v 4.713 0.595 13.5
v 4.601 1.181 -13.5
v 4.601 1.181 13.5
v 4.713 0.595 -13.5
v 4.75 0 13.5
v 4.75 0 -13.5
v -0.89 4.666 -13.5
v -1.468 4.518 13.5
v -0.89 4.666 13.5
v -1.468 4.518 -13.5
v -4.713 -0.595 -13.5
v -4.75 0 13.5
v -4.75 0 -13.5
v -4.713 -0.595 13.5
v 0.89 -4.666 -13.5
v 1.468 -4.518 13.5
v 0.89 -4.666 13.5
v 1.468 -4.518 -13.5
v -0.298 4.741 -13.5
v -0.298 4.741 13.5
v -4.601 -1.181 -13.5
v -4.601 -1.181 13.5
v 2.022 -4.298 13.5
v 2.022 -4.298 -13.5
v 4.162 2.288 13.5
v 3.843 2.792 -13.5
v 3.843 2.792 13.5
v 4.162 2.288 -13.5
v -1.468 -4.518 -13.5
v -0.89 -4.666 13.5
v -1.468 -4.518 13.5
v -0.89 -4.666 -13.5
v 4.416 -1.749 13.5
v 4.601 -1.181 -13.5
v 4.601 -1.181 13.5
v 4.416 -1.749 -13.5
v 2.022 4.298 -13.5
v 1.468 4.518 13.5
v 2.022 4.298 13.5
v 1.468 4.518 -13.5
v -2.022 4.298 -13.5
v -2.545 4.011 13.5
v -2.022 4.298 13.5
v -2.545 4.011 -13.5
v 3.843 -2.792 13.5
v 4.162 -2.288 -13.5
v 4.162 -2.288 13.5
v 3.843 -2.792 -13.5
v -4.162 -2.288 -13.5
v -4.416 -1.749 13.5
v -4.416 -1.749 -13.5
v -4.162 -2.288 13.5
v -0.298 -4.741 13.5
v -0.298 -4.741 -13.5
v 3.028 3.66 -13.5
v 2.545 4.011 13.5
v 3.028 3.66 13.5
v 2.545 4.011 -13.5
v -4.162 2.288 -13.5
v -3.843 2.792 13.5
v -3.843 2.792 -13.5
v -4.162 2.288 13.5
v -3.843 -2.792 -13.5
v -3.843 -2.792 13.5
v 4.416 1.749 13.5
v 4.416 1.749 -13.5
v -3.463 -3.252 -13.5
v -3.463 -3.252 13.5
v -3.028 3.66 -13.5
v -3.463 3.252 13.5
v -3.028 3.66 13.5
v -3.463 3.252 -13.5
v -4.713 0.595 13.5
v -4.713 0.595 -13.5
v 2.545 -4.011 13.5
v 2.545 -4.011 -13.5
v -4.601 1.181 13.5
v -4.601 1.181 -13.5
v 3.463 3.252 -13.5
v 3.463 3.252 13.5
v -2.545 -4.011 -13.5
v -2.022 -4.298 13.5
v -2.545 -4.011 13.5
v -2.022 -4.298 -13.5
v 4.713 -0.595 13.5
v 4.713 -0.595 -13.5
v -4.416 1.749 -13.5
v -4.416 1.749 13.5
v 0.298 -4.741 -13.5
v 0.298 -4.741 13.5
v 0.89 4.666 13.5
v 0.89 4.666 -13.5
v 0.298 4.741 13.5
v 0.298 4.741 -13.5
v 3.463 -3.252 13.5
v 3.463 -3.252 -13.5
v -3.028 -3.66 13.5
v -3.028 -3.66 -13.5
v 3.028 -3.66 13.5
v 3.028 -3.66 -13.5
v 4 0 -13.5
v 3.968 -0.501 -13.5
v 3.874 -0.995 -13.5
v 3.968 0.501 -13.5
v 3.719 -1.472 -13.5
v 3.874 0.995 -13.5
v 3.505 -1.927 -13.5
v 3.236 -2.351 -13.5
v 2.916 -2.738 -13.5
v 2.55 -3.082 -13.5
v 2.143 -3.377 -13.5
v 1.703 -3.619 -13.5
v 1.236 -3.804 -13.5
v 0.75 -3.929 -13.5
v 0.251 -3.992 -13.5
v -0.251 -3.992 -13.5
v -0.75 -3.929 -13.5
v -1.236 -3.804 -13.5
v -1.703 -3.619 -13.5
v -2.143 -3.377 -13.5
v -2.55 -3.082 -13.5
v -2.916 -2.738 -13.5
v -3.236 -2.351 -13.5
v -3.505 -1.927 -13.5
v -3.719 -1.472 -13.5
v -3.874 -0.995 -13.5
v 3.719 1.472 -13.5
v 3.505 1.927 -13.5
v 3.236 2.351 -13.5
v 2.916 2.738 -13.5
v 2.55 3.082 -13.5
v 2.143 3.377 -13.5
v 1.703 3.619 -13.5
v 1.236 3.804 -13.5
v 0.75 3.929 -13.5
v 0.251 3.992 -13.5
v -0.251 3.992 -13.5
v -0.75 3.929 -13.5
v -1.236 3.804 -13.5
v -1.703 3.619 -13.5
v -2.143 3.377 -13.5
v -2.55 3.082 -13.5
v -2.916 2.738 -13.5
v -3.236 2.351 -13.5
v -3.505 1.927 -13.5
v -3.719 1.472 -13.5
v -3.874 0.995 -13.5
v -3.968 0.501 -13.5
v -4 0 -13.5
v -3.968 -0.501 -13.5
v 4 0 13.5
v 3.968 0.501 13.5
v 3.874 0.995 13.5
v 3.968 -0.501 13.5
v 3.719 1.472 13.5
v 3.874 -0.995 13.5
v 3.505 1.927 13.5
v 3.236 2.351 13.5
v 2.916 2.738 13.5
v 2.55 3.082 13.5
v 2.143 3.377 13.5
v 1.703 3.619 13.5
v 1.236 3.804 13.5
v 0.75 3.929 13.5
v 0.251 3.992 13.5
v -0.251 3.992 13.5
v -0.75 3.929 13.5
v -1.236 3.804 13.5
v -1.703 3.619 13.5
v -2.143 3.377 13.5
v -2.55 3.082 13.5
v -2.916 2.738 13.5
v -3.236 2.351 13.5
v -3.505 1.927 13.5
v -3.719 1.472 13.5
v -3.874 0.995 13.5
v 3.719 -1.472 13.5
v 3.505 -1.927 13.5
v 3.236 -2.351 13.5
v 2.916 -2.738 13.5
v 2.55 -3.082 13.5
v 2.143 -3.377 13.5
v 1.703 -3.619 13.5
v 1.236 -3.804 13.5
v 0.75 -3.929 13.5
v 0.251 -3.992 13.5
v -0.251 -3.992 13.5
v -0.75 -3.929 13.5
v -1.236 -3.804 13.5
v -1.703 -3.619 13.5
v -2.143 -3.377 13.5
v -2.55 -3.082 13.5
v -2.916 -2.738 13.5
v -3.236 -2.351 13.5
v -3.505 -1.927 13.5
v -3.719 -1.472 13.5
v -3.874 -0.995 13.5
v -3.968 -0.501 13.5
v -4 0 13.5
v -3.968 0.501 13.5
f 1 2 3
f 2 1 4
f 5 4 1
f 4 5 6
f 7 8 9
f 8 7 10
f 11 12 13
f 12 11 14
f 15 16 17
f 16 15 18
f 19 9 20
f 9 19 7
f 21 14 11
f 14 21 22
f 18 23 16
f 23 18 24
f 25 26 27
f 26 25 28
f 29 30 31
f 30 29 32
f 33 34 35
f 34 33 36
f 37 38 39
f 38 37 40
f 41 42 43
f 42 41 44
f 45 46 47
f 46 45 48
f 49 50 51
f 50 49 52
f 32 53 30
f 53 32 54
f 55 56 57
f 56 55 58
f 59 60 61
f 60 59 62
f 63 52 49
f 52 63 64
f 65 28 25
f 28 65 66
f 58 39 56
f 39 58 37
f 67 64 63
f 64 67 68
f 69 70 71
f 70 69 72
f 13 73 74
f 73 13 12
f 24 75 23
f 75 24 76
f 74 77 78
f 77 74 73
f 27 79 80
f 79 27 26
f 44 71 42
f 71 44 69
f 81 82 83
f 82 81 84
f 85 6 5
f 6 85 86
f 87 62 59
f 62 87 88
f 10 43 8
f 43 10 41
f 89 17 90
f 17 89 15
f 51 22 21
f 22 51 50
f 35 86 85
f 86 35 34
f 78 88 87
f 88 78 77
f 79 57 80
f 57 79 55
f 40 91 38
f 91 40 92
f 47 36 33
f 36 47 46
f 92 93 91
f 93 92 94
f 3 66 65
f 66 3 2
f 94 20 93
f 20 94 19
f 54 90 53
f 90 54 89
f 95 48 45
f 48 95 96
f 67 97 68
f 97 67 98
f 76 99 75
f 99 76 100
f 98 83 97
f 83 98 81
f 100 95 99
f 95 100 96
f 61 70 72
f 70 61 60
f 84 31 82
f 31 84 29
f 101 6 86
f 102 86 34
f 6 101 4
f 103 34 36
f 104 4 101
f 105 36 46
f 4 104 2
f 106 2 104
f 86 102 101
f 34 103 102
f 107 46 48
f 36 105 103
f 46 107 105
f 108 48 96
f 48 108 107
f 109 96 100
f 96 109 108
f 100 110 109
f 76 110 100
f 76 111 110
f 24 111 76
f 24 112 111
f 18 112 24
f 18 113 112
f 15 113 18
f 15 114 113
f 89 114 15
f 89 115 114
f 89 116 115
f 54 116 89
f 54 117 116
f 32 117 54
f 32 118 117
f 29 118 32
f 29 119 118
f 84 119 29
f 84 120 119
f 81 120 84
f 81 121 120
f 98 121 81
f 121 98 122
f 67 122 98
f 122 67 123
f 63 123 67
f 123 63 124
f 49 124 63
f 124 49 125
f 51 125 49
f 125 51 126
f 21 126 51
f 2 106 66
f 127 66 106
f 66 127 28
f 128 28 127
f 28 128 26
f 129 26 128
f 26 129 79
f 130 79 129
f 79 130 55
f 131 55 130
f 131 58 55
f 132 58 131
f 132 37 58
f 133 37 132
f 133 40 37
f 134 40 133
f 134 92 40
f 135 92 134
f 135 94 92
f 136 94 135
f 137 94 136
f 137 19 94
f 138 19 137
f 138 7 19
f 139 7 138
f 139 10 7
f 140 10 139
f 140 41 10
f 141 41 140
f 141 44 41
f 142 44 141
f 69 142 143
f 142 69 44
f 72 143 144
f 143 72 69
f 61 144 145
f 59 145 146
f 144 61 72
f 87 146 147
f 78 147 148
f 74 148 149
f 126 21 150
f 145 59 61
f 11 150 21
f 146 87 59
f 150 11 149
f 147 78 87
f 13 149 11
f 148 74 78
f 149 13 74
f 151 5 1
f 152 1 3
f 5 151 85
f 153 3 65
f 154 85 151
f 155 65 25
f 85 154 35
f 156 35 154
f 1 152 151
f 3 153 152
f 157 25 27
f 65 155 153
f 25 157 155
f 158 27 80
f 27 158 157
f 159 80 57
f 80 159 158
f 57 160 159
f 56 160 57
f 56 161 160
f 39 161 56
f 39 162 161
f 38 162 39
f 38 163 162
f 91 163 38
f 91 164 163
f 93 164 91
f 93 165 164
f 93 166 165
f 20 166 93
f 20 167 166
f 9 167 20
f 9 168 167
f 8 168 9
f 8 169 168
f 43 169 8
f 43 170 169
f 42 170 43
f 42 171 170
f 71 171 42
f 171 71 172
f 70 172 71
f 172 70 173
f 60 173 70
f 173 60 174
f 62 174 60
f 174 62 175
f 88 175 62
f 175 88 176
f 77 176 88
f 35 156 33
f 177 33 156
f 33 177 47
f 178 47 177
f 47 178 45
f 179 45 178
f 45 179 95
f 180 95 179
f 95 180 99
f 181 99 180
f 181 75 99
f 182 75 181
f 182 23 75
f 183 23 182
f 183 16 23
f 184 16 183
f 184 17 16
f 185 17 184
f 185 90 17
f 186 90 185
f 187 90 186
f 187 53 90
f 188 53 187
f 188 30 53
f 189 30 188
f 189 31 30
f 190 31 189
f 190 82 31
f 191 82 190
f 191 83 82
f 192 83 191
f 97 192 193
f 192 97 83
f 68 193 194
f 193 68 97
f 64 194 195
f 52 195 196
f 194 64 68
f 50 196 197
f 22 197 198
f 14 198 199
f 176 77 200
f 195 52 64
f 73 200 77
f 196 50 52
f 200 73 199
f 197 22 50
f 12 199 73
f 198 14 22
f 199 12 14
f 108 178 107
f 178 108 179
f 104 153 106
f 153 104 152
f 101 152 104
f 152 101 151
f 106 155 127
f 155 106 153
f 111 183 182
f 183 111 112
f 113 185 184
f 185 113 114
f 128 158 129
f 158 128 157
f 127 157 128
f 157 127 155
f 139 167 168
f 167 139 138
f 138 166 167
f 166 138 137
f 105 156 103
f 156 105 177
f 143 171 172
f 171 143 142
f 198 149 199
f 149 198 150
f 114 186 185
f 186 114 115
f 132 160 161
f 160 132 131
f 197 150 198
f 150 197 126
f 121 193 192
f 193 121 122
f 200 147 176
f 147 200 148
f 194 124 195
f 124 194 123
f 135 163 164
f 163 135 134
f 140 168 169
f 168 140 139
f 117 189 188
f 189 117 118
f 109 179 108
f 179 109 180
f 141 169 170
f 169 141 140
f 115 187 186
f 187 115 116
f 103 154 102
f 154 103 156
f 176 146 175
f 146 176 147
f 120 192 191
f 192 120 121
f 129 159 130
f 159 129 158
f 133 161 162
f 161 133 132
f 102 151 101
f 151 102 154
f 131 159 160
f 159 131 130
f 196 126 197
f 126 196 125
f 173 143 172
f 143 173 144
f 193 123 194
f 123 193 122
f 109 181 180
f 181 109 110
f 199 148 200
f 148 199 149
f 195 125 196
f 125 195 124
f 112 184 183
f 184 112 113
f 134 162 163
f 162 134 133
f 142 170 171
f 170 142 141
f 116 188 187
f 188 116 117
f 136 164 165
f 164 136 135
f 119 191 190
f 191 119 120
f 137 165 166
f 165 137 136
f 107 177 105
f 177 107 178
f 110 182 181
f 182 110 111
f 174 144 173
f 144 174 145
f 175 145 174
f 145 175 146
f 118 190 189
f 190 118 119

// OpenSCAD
$fn = 50;


difference() {
	union() {
		translate(v = [0, 0, -13.5000000000]) {
			cylinder(h = 27, r = 4.7500000000);
		}
	}
	union() {
		translate(v = [0, 0, -100.0000000000]) {
			cylinder(h = 200, r = 4.0000000000);
		}
	}
}
